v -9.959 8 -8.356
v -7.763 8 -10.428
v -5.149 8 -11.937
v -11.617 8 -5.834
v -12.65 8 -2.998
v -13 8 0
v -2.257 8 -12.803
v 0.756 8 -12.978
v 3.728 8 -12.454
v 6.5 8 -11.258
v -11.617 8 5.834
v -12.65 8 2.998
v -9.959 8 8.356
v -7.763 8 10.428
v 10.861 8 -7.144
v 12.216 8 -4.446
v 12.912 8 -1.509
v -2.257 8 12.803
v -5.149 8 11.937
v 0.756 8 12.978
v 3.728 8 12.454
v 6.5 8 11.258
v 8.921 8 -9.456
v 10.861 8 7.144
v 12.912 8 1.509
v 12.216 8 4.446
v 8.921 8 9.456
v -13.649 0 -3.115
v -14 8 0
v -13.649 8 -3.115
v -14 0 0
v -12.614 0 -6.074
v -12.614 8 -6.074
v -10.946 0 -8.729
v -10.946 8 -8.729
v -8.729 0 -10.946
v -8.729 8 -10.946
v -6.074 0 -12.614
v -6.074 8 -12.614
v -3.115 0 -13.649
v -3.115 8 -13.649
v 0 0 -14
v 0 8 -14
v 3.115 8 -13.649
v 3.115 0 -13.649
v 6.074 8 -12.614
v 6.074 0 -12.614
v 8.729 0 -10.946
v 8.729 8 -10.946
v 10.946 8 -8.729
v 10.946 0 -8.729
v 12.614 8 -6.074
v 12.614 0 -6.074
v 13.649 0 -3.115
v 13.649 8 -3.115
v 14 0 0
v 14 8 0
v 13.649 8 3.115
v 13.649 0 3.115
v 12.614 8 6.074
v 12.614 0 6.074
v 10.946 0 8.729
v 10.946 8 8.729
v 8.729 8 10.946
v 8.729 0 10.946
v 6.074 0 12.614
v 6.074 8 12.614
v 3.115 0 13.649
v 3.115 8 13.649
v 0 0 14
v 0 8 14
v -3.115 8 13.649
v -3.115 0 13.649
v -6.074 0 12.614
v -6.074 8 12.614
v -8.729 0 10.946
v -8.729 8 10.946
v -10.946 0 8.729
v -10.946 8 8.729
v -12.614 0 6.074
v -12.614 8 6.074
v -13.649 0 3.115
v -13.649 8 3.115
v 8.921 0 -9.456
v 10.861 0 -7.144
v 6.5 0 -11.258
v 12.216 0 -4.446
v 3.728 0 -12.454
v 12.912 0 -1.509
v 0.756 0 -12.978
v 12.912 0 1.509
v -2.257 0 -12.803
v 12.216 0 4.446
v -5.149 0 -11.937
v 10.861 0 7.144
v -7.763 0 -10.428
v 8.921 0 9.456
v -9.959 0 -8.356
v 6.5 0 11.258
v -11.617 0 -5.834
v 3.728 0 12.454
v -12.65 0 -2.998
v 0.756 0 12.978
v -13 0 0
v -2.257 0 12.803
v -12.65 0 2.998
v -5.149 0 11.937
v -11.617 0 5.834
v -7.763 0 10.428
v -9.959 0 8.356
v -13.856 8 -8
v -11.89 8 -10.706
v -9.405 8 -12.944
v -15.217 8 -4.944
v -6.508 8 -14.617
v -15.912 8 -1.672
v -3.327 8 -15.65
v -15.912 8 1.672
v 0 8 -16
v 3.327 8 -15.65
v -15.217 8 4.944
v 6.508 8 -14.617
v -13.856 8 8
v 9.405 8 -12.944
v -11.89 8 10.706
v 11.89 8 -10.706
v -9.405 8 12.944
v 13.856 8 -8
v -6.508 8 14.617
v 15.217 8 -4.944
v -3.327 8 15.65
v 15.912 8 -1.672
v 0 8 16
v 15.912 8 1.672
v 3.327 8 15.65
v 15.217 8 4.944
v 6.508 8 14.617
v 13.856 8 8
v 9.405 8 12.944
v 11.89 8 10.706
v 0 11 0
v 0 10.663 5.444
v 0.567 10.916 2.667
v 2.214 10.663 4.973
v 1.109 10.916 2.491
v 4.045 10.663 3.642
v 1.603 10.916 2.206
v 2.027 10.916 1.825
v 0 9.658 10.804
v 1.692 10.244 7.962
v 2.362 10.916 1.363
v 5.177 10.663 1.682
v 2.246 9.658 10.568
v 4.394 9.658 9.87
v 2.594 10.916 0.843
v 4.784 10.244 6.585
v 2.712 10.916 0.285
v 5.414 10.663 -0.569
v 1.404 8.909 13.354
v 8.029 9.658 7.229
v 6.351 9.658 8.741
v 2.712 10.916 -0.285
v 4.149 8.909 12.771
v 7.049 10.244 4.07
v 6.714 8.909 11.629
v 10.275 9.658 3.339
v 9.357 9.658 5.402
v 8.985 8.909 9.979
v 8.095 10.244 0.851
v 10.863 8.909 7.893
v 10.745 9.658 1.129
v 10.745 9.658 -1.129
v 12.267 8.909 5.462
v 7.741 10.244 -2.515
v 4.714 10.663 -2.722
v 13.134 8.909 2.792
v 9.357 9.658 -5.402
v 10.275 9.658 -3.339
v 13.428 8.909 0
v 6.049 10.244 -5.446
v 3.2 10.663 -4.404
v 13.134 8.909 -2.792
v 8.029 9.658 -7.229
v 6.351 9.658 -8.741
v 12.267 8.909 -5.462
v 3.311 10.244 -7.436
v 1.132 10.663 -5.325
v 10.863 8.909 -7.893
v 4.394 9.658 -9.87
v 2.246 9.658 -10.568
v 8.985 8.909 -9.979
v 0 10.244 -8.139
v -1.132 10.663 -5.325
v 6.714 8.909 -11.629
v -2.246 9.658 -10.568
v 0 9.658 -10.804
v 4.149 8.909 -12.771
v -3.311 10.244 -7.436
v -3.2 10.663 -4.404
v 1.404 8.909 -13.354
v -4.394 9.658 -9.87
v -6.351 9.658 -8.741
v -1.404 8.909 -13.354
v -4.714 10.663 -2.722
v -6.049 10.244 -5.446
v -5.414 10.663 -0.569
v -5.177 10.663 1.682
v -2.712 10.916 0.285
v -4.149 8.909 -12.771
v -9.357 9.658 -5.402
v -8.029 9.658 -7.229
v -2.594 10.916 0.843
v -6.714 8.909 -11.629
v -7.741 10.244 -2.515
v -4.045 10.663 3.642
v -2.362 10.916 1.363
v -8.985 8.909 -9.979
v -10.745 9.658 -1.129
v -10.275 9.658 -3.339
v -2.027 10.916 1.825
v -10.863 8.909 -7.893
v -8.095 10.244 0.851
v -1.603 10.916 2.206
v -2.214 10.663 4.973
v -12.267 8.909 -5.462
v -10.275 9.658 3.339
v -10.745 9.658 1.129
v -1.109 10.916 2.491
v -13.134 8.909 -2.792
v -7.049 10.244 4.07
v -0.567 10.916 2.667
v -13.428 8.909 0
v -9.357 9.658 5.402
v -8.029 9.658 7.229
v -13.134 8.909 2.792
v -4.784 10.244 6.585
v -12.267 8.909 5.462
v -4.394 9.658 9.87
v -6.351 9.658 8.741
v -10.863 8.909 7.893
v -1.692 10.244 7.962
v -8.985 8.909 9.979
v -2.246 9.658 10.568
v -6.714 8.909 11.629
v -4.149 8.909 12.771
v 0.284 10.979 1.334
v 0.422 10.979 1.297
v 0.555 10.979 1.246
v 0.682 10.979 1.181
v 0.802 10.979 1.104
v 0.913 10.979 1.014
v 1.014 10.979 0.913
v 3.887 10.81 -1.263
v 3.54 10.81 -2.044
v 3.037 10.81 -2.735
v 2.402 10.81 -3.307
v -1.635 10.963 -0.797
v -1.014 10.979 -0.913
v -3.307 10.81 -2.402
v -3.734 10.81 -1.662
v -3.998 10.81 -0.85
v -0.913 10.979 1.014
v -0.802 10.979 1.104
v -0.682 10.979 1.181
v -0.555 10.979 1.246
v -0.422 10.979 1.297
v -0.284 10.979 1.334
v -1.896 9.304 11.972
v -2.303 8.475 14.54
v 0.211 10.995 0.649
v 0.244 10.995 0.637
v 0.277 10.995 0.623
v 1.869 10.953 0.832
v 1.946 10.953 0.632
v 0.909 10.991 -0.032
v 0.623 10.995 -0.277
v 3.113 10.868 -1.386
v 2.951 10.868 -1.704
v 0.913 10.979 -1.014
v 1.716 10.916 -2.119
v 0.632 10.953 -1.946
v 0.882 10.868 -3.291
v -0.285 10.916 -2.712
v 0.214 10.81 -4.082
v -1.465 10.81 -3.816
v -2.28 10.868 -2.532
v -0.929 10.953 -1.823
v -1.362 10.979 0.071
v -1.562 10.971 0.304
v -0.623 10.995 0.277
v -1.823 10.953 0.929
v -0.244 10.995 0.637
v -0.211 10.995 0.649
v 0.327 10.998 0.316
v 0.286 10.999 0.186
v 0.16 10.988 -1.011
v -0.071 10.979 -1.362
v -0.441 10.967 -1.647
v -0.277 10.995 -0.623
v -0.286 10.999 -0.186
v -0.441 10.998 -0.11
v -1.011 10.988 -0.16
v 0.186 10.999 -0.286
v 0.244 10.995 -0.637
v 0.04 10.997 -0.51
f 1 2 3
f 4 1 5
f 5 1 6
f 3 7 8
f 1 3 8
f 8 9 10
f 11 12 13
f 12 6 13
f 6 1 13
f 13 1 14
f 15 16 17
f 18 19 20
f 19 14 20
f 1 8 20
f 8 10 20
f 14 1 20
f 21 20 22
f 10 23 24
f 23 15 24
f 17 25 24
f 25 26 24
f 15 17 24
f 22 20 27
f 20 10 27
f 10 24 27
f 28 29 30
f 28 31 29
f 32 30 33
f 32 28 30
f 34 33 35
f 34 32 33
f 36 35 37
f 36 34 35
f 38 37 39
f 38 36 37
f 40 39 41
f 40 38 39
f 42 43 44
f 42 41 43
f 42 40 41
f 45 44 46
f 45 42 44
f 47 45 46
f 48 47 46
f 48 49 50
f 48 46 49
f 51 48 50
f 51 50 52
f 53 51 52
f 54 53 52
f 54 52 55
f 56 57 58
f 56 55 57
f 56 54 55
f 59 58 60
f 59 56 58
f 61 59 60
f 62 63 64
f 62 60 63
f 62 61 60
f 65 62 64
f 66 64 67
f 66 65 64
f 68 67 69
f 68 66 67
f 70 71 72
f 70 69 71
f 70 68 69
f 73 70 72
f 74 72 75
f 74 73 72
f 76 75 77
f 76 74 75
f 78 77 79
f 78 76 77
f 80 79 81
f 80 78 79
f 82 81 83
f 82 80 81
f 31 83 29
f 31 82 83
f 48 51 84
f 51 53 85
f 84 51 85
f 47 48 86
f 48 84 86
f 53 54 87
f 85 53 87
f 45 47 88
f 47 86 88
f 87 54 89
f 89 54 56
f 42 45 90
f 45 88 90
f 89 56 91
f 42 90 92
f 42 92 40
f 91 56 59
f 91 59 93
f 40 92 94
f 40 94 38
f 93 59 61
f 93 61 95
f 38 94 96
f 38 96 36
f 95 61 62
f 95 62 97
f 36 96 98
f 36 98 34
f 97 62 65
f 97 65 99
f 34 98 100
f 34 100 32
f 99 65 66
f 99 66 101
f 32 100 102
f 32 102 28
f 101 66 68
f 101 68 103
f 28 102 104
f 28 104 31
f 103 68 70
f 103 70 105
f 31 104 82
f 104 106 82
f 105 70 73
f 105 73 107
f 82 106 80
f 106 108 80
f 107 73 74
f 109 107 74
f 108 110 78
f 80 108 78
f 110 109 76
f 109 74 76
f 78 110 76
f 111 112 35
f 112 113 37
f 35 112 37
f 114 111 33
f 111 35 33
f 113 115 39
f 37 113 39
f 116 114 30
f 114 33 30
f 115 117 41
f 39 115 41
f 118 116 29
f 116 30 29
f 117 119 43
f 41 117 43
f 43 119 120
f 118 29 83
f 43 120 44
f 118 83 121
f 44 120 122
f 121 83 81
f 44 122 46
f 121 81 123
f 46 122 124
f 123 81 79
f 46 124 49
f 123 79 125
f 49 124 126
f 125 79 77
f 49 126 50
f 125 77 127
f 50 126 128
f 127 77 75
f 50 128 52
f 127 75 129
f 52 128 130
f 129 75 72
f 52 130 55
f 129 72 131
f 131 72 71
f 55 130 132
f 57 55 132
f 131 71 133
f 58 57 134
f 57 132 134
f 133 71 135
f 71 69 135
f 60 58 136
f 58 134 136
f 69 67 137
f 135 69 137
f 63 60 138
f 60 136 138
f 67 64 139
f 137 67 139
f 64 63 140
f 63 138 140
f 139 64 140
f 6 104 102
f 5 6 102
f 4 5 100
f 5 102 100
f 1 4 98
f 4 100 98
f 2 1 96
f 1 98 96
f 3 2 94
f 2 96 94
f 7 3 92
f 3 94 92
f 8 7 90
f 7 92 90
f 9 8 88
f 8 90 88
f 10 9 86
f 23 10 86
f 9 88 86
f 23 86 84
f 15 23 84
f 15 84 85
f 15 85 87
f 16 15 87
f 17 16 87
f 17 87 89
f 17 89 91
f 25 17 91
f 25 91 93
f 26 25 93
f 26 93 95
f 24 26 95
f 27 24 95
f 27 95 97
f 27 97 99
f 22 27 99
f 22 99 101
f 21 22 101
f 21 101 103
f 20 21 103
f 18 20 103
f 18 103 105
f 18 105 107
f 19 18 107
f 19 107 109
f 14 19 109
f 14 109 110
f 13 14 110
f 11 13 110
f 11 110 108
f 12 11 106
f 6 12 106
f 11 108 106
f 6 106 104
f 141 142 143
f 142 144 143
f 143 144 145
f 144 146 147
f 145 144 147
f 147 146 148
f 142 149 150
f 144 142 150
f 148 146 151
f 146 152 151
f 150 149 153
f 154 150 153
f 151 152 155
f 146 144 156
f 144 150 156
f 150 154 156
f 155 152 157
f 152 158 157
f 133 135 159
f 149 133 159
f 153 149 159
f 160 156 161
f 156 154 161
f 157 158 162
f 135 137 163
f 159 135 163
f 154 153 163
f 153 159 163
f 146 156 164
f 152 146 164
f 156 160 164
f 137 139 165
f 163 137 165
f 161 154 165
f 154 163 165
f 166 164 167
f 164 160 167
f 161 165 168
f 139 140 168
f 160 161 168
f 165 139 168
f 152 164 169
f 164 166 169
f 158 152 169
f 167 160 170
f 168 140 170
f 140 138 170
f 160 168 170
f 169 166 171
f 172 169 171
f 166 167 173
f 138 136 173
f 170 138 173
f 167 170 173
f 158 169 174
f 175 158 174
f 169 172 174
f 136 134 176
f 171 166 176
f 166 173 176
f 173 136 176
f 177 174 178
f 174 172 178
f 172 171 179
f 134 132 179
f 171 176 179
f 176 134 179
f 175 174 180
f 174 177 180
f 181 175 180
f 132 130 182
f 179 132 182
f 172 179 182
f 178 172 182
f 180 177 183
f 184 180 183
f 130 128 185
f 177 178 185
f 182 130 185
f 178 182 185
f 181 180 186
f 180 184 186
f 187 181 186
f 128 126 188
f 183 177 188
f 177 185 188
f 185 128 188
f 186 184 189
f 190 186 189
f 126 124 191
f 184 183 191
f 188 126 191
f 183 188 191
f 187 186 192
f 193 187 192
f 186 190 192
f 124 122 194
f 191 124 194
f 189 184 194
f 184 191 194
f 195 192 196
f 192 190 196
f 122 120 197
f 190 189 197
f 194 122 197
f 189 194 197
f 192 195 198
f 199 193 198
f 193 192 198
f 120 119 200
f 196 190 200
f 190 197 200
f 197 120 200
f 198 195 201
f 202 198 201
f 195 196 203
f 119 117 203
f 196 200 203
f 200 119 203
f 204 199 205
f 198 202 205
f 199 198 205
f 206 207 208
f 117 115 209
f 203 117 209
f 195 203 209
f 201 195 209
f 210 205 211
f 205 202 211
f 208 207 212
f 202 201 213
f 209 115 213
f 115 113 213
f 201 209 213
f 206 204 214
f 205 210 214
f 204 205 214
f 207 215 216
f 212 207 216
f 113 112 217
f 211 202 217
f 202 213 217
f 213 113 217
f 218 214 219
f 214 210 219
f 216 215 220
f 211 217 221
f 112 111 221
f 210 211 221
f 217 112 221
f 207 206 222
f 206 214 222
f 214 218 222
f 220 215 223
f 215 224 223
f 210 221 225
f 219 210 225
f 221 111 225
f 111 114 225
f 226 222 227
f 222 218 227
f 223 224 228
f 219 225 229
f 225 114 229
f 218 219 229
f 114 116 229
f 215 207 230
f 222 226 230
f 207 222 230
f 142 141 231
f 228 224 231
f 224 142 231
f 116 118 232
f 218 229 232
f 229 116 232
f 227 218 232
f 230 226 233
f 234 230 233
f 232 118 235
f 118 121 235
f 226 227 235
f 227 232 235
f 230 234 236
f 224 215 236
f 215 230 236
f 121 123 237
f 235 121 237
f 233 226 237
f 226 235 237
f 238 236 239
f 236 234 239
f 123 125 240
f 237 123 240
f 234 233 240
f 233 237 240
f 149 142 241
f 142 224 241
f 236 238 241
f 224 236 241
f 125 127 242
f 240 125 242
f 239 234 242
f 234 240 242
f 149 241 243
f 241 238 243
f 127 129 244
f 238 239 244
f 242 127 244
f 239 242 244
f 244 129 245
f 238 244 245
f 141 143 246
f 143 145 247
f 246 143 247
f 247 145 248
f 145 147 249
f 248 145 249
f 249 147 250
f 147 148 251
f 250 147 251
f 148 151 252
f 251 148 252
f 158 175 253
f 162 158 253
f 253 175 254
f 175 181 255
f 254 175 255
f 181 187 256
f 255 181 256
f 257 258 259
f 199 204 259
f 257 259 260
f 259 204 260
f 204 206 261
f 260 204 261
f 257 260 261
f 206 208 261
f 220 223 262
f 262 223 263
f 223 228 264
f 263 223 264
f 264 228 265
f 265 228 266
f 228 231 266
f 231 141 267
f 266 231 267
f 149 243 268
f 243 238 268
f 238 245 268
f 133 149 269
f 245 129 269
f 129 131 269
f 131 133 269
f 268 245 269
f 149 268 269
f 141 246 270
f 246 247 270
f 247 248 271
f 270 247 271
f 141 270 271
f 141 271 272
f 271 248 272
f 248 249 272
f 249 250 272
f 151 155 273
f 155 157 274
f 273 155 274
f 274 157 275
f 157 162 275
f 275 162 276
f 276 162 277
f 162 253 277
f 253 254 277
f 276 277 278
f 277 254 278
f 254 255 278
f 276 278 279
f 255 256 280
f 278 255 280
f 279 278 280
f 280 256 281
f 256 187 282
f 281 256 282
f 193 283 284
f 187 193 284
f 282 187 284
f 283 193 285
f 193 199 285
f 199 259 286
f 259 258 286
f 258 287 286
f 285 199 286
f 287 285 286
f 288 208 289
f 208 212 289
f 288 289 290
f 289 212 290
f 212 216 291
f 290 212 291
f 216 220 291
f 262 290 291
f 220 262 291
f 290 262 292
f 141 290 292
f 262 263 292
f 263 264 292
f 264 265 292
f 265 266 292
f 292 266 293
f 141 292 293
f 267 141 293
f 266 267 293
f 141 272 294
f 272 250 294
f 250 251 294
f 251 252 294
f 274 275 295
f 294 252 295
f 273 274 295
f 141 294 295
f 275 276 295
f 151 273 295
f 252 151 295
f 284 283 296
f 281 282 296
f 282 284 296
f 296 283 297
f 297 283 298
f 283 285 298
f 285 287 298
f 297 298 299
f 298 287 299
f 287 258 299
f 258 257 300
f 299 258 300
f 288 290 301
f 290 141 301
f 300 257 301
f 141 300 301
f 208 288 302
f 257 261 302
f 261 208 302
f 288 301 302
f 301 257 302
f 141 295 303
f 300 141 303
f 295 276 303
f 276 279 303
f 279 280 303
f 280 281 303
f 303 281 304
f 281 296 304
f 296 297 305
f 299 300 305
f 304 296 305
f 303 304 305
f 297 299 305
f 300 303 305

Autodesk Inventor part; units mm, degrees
ref_plane "YZ Plane" through (0, 0, 0) normal (1, 0, 0) x (0, 1, 0)
ref_plane "XZ Plane" through (0, 0, 0) normal (0, 1, 0) x (-1, 0, 0)
ref_plane "XY Plane" through (0, 0, 0) normal (0, 0, 1) x (1, 0, 0)
sketch "Szkic1" plane through (0, 0, 0) normal (0, 1, 0) x (-1, 0, 0)
  circle A0 centre (0, 0) radius 14
  dimension "d0" = 28
extrude "Wyciągnięcie proste1" add sketch "Szkic1" along normal blind 8
shell "Skorupa1" thickness 1 removed faces 2 at (-0.5625, 0, 1.5565) at (-0.5625, 8, 1.5565)
sketch "Szkic2" plane through (0, 0, 0) normal (1, 0, 0) x (0, 1, 0)
  line L0 (8, -14) -> (8, 14) construction
  line L1 (8, 0) -> (11, 0)
  line L2 (8, 0) -> (8, 16)
  arc A0 (11, 0) -> (8, 16) centre (-33.1667, 0) ccw
  point P0 (0, 0)
  dimension "d4" = 3
  dimension "d5" = 16
revolve "Obrót1" add sketch "Szkic2" angle 360 about axis through (0, 8, 0) along (0, 1, 0)
properties part number "Zaślepka_do_rur_fi32" material "Polietylen o dużej gęstości"
